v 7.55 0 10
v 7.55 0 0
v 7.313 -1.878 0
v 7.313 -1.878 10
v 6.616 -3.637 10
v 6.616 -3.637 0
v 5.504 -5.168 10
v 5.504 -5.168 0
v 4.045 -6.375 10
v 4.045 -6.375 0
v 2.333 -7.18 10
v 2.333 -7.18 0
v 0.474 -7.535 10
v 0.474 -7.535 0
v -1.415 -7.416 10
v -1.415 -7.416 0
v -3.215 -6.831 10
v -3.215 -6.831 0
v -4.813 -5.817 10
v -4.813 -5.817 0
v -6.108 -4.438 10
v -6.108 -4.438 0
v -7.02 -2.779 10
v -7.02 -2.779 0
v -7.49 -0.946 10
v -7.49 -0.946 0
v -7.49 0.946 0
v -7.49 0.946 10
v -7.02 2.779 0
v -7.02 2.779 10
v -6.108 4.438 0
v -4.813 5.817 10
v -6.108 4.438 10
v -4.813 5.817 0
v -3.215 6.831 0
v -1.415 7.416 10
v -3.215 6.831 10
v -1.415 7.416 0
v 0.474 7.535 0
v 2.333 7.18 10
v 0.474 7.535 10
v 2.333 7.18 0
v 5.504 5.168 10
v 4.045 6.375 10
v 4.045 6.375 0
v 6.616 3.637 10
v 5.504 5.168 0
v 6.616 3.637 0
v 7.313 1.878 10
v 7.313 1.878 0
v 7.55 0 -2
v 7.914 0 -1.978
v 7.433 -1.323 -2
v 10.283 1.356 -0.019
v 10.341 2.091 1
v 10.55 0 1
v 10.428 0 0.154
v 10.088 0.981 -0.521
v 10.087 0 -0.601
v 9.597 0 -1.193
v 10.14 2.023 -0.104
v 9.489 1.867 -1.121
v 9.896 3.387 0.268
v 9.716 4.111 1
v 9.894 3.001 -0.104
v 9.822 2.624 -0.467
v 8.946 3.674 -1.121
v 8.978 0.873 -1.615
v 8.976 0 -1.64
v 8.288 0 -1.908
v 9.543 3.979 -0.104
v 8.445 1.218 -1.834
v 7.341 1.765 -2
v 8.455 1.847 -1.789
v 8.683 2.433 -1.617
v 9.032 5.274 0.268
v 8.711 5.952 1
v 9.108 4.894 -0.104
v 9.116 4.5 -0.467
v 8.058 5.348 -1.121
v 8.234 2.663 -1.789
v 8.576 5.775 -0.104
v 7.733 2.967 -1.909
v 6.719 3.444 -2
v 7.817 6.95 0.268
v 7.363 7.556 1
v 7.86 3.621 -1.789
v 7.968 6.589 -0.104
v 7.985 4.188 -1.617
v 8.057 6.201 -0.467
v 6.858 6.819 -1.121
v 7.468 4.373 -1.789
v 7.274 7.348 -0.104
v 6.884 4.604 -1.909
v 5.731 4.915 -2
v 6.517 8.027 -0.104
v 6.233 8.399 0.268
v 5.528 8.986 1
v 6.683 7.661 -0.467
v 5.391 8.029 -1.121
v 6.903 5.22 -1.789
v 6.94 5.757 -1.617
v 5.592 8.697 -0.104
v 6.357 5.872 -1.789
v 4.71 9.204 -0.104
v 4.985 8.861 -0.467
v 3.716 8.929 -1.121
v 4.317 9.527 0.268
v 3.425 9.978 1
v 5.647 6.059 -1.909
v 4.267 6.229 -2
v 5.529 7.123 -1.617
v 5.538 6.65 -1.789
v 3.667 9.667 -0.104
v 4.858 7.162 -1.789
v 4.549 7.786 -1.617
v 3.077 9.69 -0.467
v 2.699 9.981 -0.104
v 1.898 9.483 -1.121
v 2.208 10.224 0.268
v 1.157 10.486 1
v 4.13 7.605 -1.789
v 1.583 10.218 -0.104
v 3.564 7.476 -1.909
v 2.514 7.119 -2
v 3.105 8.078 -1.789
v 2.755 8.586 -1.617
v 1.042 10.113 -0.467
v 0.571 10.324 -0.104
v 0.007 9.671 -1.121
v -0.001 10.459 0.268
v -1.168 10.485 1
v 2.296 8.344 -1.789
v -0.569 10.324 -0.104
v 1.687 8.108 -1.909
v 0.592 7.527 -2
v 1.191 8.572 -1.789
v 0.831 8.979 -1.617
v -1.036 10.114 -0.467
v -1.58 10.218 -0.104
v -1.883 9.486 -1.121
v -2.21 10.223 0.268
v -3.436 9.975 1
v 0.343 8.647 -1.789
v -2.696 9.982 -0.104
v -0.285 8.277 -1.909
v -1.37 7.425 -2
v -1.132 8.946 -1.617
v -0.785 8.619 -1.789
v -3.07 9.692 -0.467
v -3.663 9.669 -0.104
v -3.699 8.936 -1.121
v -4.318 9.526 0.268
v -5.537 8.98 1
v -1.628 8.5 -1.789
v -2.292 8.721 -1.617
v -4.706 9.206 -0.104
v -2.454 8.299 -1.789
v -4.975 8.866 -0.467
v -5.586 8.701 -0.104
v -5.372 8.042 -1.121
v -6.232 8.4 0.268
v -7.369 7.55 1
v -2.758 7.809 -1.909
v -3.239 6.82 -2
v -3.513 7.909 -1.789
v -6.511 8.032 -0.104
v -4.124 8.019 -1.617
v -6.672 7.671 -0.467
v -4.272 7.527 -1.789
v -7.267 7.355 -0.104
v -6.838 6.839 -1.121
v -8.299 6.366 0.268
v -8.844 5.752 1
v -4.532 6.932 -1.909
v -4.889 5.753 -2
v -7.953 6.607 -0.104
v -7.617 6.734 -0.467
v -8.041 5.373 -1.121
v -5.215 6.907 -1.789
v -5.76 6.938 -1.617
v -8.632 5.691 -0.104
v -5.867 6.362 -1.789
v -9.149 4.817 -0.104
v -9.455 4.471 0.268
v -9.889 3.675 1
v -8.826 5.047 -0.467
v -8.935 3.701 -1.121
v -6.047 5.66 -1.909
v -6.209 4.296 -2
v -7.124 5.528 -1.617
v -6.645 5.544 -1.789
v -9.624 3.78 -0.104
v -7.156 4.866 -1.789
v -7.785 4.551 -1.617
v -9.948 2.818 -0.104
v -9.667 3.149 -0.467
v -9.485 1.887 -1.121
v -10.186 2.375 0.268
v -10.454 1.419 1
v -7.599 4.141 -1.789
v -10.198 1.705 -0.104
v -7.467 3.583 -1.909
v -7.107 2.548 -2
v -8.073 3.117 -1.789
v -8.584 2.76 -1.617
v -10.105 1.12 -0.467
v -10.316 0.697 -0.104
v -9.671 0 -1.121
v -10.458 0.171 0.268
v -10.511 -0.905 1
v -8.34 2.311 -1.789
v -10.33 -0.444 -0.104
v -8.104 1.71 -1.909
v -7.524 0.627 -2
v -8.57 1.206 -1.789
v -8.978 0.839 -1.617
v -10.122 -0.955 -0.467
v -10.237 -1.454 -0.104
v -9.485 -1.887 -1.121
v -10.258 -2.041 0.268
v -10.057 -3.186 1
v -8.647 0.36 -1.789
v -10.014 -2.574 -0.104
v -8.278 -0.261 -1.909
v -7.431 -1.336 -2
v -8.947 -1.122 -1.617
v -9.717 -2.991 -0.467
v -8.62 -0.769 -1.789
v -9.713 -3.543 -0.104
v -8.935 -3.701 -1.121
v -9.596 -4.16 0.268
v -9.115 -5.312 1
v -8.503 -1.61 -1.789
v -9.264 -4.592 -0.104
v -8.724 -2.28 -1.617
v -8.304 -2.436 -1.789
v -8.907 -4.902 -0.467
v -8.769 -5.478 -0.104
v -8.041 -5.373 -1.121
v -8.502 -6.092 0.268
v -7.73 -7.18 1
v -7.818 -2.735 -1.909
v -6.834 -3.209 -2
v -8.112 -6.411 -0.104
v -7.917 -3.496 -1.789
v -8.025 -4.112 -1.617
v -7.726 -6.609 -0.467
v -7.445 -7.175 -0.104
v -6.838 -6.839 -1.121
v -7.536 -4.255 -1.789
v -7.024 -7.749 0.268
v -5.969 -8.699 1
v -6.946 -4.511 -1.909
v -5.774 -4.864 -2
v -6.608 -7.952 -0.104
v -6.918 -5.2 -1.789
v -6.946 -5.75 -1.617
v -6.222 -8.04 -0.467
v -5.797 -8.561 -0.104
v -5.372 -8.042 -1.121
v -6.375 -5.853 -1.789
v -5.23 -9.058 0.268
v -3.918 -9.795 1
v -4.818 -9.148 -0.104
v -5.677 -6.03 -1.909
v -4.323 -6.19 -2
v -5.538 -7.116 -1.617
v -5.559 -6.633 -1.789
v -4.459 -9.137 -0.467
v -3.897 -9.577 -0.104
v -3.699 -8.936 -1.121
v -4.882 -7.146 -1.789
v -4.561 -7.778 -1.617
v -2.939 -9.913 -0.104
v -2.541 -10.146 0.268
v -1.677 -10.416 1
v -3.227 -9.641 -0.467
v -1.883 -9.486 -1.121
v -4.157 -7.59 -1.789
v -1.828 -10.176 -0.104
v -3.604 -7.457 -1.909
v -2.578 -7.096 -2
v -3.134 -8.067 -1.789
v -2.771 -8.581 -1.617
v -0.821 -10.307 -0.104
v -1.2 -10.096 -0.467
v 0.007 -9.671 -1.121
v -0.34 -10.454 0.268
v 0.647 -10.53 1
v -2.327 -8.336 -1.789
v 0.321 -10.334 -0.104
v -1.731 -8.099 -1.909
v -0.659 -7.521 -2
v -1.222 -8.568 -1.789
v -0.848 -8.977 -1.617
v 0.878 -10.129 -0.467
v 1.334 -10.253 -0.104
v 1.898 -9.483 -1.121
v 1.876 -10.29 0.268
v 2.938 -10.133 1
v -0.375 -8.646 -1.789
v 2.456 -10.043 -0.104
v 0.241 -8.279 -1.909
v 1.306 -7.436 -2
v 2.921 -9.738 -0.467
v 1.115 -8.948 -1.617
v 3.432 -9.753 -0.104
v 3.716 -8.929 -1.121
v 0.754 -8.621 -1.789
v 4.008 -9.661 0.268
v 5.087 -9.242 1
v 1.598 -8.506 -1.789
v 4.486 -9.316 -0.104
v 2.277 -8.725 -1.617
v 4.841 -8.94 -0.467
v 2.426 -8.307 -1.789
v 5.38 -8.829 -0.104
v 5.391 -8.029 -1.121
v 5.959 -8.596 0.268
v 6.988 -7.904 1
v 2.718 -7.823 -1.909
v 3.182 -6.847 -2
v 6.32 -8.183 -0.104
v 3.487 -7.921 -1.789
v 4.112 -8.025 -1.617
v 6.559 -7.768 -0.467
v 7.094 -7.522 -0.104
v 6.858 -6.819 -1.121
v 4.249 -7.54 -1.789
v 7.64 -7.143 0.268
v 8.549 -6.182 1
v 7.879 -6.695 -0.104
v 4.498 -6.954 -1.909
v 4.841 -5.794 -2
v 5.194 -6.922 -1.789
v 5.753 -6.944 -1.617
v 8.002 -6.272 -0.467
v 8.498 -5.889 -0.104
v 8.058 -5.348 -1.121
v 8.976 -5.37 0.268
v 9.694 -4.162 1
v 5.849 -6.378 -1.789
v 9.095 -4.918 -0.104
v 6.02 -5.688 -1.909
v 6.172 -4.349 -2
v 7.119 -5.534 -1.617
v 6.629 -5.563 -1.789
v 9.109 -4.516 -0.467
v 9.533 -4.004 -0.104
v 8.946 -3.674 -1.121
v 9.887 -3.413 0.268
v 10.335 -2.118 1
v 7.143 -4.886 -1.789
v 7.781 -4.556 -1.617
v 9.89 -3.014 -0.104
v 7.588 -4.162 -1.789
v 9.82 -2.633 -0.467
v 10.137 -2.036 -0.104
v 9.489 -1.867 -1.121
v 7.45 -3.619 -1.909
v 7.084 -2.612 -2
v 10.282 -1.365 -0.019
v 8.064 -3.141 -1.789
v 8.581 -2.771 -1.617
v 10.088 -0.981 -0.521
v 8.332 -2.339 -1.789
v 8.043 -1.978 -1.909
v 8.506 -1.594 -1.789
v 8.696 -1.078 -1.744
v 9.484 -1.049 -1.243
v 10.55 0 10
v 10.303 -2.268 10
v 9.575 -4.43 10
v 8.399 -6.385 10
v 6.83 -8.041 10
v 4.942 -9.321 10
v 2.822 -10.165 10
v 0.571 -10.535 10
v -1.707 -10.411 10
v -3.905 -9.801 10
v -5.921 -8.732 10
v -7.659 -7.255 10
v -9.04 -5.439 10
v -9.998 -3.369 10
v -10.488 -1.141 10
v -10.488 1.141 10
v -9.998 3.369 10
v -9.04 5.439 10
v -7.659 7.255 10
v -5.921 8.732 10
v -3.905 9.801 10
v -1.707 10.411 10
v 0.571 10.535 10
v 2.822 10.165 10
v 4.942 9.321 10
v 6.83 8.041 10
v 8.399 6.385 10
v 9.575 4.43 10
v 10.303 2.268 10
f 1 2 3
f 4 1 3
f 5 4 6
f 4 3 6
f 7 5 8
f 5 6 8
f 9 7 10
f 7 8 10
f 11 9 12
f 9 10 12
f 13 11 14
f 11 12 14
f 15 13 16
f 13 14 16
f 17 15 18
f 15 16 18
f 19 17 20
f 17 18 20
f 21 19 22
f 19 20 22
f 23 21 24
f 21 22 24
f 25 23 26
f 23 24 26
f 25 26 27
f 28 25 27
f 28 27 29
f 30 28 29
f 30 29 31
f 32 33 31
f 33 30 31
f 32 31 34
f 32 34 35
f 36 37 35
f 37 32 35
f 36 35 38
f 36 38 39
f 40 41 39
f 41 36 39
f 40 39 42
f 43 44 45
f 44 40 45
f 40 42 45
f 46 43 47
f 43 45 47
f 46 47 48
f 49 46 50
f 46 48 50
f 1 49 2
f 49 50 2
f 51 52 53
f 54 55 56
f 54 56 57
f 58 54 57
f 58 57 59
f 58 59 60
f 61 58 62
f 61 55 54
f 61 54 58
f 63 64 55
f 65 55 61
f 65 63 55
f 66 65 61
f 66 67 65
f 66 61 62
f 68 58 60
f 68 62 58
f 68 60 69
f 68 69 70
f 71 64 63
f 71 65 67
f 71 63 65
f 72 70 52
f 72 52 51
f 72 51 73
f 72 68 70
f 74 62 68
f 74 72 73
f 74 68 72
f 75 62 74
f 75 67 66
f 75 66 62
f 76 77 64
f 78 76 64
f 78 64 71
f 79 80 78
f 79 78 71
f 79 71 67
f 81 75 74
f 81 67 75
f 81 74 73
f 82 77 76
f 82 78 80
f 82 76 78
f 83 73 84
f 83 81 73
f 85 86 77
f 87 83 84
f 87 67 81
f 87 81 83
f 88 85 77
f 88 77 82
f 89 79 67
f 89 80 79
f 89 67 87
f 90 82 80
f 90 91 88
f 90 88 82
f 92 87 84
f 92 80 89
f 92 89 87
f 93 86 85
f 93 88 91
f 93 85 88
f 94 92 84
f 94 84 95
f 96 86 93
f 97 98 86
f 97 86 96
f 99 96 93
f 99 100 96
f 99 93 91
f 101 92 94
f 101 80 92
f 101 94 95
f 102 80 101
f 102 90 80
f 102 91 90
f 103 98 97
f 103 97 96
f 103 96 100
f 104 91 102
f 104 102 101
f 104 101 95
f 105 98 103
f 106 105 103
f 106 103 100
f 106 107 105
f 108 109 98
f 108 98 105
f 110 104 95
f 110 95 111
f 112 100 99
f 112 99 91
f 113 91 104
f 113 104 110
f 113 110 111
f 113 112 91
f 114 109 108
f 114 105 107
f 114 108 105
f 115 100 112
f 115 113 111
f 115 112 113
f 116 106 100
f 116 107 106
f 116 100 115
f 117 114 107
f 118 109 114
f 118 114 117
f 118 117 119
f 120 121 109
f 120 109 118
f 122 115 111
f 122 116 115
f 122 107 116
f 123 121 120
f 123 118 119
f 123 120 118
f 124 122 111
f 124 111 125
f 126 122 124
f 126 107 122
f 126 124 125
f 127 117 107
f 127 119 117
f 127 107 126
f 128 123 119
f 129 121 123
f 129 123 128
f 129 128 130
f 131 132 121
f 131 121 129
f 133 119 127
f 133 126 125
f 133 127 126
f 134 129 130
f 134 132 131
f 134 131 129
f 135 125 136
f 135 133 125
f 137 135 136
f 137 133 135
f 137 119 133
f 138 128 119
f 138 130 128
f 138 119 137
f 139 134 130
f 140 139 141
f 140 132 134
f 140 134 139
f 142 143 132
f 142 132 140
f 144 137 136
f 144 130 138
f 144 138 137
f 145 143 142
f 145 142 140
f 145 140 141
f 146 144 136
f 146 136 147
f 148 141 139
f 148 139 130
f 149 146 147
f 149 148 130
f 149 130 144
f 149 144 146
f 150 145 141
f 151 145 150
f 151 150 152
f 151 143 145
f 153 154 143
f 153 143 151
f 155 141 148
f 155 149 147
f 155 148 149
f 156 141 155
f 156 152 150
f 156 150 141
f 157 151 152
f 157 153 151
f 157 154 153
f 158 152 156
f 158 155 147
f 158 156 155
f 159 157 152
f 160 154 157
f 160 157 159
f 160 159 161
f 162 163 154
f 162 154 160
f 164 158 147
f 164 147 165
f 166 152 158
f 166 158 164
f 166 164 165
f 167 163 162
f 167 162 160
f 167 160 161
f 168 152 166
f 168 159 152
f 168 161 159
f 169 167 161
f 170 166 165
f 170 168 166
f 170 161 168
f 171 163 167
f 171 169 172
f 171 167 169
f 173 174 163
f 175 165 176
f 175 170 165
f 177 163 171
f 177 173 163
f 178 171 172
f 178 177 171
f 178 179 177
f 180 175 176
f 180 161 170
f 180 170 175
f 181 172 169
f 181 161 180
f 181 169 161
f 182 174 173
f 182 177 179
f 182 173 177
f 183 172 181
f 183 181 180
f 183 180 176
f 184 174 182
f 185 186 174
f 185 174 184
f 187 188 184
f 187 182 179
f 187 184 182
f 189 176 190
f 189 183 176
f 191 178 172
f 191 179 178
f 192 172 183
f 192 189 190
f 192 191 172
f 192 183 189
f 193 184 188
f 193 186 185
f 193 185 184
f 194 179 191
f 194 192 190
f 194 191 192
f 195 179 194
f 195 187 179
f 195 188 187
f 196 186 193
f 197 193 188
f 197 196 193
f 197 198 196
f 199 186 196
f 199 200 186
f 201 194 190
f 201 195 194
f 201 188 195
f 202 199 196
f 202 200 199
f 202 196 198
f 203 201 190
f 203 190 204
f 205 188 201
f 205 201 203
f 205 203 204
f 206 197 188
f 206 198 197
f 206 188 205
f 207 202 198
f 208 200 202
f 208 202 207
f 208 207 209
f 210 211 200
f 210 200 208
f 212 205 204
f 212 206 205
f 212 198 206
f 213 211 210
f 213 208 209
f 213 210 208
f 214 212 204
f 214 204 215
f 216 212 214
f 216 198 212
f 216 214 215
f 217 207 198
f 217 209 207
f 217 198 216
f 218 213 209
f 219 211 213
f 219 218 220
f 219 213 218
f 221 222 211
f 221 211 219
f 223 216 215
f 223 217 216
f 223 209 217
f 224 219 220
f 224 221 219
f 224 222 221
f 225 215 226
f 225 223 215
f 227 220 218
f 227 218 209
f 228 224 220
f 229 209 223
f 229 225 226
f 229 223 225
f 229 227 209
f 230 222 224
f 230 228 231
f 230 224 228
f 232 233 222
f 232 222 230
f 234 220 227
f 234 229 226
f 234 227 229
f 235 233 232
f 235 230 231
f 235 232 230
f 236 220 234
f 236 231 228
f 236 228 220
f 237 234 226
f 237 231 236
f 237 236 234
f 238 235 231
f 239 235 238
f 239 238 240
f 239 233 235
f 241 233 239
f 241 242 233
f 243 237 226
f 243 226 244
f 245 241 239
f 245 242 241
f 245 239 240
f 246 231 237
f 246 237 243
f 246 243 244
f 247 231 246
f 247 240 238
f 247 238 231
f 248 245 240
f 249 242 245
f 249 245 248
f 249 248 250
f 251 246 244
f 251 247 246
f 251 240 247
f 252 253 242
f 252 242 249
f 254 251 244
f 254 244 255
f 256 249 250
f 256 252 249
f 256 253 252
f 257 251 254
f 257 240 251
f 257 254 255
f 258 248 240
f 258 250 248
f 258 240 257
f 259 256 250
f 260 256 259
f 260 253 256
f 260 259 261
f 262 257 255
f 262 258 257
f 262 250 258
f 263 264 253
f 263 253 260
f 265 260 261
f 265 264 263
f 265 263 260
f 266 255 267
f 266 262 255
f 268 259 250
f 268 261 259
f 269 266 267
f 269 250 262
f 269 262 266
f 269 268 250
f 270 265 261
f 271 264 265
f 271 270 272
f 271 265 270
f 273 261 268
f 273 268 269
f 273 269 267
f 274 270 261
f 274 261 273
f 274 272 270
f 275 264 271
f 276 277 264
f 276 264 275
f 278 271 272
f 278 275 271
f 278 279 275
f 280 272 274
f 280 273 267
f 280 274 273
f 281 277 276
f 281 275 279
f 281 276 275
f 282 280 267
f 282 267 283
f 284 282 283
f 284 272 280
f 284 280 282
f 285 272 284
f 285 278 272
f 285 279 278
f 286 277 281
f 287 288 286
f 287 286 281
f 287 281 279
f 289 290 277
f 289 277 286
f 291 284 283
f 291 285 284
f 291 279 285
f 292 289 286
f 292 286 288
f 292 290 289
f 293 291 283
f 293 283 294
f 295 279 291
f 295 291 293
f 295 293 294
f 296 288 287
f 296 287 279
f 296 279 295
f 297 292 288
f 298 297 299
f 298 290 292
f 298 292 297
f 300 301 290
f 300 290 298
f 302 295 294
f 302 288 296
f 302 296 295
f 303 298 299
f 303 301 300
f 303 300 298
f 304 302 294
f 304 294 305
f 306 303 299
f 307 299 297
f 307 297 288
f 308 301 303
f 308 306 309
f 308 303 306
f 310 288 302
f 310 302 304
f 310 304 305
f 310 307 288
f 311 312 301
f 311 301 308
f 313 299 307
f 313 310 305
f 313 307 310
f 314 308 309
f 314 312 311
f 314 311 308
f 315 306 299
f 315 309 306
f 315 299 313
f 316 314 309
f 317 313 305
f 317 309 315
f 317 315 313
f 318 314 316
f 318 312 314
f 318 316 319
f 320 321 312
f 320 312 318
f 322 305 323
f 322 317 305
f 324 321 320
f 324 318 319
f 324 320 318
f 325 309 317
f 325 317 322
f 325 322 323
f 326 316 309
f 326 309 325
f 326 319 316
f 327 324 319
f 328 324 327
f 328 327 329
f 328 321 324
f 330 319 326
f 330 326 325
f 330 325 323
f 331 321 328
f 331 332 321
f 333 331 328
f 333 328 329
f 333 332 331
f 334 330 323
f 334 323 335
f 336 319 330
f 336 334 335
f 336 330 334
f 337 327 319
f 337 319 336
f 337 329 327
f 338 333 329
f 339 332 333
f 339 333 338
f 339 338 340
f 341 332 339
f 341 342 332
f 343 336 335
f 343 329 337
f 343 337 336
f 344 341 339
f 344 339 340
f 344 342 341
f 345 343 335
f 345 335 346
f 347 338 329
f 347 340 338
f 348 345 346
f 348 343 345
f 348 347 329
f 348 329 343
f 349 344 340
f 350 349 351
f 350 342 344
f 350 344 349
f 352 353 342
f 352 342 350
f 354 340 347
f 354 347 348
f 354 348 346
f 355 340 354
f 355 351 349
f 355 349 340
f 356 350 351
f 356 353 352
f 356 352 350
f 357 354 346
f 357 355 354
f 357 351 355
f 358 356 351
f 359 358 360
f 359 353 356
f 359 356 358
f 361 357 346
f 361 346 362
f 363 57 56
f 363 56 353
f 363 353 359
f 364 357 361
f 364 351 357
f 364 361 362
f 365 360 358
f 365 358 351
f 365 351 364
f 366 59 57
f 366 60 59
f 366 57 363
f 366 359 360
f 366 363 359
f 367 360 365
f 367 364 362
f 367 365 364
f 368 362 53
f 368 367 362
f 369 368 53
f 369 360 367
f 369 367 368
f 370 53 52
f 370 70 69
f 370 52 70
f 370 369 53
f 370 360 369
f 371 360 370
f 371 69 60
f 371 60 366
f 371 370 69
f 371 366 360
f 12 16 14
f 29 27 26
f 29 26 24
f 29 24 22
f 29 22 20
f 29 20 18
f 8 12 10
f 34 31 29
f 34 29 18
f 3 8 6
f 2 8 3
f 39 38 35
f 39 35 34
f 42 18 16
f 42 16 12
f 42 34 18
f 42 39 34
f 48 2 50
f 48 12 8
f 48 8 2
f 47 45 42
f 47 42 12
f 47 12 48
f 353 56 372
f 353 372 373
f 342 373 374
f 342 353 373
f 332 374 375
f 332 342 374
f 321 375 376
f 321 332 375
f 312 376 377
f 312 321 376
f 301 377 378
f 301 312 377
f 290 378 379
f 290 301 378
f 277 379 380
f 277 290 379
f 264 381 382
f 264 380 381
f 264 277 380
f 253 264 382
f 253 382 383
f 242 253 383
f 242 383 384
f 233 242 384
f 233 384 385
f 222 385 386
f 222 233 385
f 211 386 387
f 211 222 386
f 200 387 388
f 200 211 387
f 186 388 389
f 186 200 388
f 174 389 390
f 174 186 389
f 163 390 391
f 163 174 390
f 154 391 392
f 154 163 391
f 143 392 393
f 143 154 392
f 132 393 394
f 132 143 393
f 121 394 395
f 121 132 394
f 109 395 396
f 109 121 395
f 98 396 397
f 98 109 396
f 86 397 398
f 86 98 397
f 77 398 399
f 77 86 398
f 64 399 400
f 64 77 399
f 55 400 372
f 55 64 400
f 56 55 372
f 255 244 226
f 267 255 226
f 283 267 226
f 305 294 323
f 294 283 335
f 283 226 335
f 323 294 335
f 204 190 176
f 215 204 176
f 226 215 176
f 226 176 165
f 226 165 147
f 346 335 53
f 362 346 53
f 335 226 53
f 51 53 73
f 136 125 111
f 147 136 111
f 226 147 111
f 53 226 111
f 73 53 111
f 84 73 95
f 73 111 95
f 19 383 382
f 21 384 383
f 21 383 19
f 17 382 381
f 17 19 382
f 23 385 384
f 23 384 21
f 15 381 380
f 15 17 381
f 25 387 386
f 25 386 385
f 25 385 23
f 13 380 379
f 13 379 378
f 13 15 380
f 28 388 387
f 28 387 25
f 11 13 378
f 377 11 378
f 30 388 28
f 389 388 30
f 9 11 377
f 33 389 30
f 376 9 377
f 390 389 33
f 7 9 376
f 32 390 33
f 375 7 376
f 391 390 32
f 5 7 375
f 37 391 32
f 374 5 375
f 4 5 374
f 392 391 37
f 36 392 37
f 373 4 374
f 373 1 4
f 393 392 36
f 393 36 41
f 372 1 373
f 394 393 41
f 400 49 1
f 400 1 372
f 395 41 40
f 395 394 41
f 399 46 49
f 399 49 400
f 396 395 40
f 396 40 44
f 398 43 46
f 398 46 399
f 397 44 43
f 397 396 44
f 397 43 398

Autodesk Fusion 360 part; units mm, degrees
sketch "Sketch1" plane through (0, 0, 0) normal (0, 0, 1) x (1, 0, 0)
  circle A0 centre (0, 0) radius 7.55
  circle A1 centre (0, 0) radius 10.55
  dimension "d1" = 3
  dimension "d2" = 15.1
extrude "Extrude1" add sketch "Sketch1" along normal blind 10
extrude "Extrude2" add sketch "Sketch1" against normal blind 2 contours A0 | A1
fillet "Fillet1" radius 3 1 edges at (-9.8361, 3.815, -2)
